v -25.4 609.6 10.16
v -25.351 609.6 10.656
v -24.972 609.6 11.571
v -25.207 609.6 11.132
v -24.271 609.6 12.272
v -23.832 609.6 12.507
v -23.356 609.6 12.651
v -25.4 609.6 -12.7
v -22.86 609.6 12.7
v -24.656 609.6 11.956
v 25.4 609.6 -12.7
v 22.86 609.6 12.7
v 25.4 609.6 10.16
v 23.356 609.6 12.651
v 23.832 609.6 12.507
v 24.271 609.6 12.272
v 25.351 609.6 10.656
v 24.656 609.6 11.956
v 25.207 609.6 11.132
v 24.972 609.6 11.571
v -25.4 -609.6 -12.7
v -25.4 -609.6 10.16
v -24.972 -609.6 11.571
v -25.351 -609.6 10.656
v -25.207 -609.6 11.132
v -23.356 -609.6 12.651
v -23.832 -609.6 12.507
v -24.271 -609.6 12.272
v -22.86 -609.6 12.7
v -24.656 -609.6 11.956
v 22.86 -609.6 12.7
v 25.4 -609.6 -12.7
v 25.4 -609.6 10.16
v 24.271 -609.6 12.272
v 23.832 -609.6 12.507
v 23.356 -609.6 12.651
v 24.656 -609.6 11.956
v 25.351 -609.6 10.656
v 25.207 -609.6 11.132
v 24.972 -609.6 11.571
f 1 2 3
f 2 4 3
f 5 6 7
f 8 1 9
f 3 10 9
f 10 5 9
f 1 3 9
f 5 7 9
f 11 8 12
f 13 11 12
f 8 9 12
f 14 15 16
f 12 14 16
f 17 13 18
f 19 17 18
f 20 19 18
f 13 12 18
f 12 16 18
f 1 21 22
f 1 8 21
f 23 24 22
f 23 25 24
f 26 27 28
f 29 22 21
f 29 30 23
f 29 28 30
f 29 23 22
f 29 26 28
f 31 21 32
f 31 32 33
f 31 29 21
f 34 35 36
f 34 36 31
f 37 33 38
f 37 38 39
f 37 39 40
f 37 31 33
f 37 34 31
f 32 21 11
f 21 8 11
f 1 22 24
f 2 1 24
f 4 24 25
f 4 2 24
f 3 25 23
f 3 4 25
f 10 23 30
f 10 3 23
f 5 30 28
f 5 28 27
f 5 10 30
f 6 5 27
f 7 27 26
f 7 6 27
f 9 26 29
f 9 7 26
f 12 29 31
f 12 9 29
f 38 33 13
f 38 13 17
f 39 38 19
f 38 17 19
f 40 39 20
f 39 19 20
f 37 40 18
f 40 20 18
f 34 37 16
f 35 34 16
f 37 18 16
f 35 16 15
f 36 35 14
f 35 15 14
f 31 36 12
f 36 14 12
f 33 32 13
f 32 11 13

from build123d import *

# Parameters (mm, degrees)
F0_W     = 50.8
F0_H     = 50.8
F1_DEPTH = 304.8
F2_DEPTH = 12.7
F3_DEPTH = 12.7
F4_DEPTH = 304.8
F5_DEPTH = 304.8
F6_R     = 2.54


with BuildPart() as f1:
    # F0 (on Front) → F1 (new body, symmetric)
    with BuildSketch(Plane.XZ):
        Rectangle(F0_W, F0_H)
    extrude(amount=F1_DEPTH, both=True)

    # F2 (cut): a face of the model
    f2_faces = [f1.faces().sort_by_distance(p)[0] for p in [
        (0, 0, 25.4),
    ]]
    extrude(f2_faces, amount=-F2_DEPTH, mode=Mode.SUBTRACT)

    # F3 (cut): a face of the model
    f3_faces = [f1.faces().sort_by_distance(p)[0] for p in [
        (0, 0, -25.4),
    ]]
    extrude(f3_faces, amount=-F3_DEPTH, mode=Mode.SUBTRACT)

    # F4 (add): a face of the model
    f4_faces = [f1.faces().sort_by_distance(p)[0] for p in [
        (0, 304.8, 0),
    ]]
    extrude(f4_faces, amount=F4_DEPTH)

    # F5 (add): a face of the model
    f5_faces = [f1.faces().sort_by_distance(p)[0] for p in [
        (0, -304.8, 0),
    ]]
    extrude(f5_faces, amount=F5_DEPTH)

    # F6
    f6_edges = [f1.edges().sort_by_distance(p)[0] for p in [
        (-25.4, 0, 12.7),
        (25.4, 0, 12.7),
    ]]
    fillet(f6_edges, radius=F6_R)


solid = f1.part
